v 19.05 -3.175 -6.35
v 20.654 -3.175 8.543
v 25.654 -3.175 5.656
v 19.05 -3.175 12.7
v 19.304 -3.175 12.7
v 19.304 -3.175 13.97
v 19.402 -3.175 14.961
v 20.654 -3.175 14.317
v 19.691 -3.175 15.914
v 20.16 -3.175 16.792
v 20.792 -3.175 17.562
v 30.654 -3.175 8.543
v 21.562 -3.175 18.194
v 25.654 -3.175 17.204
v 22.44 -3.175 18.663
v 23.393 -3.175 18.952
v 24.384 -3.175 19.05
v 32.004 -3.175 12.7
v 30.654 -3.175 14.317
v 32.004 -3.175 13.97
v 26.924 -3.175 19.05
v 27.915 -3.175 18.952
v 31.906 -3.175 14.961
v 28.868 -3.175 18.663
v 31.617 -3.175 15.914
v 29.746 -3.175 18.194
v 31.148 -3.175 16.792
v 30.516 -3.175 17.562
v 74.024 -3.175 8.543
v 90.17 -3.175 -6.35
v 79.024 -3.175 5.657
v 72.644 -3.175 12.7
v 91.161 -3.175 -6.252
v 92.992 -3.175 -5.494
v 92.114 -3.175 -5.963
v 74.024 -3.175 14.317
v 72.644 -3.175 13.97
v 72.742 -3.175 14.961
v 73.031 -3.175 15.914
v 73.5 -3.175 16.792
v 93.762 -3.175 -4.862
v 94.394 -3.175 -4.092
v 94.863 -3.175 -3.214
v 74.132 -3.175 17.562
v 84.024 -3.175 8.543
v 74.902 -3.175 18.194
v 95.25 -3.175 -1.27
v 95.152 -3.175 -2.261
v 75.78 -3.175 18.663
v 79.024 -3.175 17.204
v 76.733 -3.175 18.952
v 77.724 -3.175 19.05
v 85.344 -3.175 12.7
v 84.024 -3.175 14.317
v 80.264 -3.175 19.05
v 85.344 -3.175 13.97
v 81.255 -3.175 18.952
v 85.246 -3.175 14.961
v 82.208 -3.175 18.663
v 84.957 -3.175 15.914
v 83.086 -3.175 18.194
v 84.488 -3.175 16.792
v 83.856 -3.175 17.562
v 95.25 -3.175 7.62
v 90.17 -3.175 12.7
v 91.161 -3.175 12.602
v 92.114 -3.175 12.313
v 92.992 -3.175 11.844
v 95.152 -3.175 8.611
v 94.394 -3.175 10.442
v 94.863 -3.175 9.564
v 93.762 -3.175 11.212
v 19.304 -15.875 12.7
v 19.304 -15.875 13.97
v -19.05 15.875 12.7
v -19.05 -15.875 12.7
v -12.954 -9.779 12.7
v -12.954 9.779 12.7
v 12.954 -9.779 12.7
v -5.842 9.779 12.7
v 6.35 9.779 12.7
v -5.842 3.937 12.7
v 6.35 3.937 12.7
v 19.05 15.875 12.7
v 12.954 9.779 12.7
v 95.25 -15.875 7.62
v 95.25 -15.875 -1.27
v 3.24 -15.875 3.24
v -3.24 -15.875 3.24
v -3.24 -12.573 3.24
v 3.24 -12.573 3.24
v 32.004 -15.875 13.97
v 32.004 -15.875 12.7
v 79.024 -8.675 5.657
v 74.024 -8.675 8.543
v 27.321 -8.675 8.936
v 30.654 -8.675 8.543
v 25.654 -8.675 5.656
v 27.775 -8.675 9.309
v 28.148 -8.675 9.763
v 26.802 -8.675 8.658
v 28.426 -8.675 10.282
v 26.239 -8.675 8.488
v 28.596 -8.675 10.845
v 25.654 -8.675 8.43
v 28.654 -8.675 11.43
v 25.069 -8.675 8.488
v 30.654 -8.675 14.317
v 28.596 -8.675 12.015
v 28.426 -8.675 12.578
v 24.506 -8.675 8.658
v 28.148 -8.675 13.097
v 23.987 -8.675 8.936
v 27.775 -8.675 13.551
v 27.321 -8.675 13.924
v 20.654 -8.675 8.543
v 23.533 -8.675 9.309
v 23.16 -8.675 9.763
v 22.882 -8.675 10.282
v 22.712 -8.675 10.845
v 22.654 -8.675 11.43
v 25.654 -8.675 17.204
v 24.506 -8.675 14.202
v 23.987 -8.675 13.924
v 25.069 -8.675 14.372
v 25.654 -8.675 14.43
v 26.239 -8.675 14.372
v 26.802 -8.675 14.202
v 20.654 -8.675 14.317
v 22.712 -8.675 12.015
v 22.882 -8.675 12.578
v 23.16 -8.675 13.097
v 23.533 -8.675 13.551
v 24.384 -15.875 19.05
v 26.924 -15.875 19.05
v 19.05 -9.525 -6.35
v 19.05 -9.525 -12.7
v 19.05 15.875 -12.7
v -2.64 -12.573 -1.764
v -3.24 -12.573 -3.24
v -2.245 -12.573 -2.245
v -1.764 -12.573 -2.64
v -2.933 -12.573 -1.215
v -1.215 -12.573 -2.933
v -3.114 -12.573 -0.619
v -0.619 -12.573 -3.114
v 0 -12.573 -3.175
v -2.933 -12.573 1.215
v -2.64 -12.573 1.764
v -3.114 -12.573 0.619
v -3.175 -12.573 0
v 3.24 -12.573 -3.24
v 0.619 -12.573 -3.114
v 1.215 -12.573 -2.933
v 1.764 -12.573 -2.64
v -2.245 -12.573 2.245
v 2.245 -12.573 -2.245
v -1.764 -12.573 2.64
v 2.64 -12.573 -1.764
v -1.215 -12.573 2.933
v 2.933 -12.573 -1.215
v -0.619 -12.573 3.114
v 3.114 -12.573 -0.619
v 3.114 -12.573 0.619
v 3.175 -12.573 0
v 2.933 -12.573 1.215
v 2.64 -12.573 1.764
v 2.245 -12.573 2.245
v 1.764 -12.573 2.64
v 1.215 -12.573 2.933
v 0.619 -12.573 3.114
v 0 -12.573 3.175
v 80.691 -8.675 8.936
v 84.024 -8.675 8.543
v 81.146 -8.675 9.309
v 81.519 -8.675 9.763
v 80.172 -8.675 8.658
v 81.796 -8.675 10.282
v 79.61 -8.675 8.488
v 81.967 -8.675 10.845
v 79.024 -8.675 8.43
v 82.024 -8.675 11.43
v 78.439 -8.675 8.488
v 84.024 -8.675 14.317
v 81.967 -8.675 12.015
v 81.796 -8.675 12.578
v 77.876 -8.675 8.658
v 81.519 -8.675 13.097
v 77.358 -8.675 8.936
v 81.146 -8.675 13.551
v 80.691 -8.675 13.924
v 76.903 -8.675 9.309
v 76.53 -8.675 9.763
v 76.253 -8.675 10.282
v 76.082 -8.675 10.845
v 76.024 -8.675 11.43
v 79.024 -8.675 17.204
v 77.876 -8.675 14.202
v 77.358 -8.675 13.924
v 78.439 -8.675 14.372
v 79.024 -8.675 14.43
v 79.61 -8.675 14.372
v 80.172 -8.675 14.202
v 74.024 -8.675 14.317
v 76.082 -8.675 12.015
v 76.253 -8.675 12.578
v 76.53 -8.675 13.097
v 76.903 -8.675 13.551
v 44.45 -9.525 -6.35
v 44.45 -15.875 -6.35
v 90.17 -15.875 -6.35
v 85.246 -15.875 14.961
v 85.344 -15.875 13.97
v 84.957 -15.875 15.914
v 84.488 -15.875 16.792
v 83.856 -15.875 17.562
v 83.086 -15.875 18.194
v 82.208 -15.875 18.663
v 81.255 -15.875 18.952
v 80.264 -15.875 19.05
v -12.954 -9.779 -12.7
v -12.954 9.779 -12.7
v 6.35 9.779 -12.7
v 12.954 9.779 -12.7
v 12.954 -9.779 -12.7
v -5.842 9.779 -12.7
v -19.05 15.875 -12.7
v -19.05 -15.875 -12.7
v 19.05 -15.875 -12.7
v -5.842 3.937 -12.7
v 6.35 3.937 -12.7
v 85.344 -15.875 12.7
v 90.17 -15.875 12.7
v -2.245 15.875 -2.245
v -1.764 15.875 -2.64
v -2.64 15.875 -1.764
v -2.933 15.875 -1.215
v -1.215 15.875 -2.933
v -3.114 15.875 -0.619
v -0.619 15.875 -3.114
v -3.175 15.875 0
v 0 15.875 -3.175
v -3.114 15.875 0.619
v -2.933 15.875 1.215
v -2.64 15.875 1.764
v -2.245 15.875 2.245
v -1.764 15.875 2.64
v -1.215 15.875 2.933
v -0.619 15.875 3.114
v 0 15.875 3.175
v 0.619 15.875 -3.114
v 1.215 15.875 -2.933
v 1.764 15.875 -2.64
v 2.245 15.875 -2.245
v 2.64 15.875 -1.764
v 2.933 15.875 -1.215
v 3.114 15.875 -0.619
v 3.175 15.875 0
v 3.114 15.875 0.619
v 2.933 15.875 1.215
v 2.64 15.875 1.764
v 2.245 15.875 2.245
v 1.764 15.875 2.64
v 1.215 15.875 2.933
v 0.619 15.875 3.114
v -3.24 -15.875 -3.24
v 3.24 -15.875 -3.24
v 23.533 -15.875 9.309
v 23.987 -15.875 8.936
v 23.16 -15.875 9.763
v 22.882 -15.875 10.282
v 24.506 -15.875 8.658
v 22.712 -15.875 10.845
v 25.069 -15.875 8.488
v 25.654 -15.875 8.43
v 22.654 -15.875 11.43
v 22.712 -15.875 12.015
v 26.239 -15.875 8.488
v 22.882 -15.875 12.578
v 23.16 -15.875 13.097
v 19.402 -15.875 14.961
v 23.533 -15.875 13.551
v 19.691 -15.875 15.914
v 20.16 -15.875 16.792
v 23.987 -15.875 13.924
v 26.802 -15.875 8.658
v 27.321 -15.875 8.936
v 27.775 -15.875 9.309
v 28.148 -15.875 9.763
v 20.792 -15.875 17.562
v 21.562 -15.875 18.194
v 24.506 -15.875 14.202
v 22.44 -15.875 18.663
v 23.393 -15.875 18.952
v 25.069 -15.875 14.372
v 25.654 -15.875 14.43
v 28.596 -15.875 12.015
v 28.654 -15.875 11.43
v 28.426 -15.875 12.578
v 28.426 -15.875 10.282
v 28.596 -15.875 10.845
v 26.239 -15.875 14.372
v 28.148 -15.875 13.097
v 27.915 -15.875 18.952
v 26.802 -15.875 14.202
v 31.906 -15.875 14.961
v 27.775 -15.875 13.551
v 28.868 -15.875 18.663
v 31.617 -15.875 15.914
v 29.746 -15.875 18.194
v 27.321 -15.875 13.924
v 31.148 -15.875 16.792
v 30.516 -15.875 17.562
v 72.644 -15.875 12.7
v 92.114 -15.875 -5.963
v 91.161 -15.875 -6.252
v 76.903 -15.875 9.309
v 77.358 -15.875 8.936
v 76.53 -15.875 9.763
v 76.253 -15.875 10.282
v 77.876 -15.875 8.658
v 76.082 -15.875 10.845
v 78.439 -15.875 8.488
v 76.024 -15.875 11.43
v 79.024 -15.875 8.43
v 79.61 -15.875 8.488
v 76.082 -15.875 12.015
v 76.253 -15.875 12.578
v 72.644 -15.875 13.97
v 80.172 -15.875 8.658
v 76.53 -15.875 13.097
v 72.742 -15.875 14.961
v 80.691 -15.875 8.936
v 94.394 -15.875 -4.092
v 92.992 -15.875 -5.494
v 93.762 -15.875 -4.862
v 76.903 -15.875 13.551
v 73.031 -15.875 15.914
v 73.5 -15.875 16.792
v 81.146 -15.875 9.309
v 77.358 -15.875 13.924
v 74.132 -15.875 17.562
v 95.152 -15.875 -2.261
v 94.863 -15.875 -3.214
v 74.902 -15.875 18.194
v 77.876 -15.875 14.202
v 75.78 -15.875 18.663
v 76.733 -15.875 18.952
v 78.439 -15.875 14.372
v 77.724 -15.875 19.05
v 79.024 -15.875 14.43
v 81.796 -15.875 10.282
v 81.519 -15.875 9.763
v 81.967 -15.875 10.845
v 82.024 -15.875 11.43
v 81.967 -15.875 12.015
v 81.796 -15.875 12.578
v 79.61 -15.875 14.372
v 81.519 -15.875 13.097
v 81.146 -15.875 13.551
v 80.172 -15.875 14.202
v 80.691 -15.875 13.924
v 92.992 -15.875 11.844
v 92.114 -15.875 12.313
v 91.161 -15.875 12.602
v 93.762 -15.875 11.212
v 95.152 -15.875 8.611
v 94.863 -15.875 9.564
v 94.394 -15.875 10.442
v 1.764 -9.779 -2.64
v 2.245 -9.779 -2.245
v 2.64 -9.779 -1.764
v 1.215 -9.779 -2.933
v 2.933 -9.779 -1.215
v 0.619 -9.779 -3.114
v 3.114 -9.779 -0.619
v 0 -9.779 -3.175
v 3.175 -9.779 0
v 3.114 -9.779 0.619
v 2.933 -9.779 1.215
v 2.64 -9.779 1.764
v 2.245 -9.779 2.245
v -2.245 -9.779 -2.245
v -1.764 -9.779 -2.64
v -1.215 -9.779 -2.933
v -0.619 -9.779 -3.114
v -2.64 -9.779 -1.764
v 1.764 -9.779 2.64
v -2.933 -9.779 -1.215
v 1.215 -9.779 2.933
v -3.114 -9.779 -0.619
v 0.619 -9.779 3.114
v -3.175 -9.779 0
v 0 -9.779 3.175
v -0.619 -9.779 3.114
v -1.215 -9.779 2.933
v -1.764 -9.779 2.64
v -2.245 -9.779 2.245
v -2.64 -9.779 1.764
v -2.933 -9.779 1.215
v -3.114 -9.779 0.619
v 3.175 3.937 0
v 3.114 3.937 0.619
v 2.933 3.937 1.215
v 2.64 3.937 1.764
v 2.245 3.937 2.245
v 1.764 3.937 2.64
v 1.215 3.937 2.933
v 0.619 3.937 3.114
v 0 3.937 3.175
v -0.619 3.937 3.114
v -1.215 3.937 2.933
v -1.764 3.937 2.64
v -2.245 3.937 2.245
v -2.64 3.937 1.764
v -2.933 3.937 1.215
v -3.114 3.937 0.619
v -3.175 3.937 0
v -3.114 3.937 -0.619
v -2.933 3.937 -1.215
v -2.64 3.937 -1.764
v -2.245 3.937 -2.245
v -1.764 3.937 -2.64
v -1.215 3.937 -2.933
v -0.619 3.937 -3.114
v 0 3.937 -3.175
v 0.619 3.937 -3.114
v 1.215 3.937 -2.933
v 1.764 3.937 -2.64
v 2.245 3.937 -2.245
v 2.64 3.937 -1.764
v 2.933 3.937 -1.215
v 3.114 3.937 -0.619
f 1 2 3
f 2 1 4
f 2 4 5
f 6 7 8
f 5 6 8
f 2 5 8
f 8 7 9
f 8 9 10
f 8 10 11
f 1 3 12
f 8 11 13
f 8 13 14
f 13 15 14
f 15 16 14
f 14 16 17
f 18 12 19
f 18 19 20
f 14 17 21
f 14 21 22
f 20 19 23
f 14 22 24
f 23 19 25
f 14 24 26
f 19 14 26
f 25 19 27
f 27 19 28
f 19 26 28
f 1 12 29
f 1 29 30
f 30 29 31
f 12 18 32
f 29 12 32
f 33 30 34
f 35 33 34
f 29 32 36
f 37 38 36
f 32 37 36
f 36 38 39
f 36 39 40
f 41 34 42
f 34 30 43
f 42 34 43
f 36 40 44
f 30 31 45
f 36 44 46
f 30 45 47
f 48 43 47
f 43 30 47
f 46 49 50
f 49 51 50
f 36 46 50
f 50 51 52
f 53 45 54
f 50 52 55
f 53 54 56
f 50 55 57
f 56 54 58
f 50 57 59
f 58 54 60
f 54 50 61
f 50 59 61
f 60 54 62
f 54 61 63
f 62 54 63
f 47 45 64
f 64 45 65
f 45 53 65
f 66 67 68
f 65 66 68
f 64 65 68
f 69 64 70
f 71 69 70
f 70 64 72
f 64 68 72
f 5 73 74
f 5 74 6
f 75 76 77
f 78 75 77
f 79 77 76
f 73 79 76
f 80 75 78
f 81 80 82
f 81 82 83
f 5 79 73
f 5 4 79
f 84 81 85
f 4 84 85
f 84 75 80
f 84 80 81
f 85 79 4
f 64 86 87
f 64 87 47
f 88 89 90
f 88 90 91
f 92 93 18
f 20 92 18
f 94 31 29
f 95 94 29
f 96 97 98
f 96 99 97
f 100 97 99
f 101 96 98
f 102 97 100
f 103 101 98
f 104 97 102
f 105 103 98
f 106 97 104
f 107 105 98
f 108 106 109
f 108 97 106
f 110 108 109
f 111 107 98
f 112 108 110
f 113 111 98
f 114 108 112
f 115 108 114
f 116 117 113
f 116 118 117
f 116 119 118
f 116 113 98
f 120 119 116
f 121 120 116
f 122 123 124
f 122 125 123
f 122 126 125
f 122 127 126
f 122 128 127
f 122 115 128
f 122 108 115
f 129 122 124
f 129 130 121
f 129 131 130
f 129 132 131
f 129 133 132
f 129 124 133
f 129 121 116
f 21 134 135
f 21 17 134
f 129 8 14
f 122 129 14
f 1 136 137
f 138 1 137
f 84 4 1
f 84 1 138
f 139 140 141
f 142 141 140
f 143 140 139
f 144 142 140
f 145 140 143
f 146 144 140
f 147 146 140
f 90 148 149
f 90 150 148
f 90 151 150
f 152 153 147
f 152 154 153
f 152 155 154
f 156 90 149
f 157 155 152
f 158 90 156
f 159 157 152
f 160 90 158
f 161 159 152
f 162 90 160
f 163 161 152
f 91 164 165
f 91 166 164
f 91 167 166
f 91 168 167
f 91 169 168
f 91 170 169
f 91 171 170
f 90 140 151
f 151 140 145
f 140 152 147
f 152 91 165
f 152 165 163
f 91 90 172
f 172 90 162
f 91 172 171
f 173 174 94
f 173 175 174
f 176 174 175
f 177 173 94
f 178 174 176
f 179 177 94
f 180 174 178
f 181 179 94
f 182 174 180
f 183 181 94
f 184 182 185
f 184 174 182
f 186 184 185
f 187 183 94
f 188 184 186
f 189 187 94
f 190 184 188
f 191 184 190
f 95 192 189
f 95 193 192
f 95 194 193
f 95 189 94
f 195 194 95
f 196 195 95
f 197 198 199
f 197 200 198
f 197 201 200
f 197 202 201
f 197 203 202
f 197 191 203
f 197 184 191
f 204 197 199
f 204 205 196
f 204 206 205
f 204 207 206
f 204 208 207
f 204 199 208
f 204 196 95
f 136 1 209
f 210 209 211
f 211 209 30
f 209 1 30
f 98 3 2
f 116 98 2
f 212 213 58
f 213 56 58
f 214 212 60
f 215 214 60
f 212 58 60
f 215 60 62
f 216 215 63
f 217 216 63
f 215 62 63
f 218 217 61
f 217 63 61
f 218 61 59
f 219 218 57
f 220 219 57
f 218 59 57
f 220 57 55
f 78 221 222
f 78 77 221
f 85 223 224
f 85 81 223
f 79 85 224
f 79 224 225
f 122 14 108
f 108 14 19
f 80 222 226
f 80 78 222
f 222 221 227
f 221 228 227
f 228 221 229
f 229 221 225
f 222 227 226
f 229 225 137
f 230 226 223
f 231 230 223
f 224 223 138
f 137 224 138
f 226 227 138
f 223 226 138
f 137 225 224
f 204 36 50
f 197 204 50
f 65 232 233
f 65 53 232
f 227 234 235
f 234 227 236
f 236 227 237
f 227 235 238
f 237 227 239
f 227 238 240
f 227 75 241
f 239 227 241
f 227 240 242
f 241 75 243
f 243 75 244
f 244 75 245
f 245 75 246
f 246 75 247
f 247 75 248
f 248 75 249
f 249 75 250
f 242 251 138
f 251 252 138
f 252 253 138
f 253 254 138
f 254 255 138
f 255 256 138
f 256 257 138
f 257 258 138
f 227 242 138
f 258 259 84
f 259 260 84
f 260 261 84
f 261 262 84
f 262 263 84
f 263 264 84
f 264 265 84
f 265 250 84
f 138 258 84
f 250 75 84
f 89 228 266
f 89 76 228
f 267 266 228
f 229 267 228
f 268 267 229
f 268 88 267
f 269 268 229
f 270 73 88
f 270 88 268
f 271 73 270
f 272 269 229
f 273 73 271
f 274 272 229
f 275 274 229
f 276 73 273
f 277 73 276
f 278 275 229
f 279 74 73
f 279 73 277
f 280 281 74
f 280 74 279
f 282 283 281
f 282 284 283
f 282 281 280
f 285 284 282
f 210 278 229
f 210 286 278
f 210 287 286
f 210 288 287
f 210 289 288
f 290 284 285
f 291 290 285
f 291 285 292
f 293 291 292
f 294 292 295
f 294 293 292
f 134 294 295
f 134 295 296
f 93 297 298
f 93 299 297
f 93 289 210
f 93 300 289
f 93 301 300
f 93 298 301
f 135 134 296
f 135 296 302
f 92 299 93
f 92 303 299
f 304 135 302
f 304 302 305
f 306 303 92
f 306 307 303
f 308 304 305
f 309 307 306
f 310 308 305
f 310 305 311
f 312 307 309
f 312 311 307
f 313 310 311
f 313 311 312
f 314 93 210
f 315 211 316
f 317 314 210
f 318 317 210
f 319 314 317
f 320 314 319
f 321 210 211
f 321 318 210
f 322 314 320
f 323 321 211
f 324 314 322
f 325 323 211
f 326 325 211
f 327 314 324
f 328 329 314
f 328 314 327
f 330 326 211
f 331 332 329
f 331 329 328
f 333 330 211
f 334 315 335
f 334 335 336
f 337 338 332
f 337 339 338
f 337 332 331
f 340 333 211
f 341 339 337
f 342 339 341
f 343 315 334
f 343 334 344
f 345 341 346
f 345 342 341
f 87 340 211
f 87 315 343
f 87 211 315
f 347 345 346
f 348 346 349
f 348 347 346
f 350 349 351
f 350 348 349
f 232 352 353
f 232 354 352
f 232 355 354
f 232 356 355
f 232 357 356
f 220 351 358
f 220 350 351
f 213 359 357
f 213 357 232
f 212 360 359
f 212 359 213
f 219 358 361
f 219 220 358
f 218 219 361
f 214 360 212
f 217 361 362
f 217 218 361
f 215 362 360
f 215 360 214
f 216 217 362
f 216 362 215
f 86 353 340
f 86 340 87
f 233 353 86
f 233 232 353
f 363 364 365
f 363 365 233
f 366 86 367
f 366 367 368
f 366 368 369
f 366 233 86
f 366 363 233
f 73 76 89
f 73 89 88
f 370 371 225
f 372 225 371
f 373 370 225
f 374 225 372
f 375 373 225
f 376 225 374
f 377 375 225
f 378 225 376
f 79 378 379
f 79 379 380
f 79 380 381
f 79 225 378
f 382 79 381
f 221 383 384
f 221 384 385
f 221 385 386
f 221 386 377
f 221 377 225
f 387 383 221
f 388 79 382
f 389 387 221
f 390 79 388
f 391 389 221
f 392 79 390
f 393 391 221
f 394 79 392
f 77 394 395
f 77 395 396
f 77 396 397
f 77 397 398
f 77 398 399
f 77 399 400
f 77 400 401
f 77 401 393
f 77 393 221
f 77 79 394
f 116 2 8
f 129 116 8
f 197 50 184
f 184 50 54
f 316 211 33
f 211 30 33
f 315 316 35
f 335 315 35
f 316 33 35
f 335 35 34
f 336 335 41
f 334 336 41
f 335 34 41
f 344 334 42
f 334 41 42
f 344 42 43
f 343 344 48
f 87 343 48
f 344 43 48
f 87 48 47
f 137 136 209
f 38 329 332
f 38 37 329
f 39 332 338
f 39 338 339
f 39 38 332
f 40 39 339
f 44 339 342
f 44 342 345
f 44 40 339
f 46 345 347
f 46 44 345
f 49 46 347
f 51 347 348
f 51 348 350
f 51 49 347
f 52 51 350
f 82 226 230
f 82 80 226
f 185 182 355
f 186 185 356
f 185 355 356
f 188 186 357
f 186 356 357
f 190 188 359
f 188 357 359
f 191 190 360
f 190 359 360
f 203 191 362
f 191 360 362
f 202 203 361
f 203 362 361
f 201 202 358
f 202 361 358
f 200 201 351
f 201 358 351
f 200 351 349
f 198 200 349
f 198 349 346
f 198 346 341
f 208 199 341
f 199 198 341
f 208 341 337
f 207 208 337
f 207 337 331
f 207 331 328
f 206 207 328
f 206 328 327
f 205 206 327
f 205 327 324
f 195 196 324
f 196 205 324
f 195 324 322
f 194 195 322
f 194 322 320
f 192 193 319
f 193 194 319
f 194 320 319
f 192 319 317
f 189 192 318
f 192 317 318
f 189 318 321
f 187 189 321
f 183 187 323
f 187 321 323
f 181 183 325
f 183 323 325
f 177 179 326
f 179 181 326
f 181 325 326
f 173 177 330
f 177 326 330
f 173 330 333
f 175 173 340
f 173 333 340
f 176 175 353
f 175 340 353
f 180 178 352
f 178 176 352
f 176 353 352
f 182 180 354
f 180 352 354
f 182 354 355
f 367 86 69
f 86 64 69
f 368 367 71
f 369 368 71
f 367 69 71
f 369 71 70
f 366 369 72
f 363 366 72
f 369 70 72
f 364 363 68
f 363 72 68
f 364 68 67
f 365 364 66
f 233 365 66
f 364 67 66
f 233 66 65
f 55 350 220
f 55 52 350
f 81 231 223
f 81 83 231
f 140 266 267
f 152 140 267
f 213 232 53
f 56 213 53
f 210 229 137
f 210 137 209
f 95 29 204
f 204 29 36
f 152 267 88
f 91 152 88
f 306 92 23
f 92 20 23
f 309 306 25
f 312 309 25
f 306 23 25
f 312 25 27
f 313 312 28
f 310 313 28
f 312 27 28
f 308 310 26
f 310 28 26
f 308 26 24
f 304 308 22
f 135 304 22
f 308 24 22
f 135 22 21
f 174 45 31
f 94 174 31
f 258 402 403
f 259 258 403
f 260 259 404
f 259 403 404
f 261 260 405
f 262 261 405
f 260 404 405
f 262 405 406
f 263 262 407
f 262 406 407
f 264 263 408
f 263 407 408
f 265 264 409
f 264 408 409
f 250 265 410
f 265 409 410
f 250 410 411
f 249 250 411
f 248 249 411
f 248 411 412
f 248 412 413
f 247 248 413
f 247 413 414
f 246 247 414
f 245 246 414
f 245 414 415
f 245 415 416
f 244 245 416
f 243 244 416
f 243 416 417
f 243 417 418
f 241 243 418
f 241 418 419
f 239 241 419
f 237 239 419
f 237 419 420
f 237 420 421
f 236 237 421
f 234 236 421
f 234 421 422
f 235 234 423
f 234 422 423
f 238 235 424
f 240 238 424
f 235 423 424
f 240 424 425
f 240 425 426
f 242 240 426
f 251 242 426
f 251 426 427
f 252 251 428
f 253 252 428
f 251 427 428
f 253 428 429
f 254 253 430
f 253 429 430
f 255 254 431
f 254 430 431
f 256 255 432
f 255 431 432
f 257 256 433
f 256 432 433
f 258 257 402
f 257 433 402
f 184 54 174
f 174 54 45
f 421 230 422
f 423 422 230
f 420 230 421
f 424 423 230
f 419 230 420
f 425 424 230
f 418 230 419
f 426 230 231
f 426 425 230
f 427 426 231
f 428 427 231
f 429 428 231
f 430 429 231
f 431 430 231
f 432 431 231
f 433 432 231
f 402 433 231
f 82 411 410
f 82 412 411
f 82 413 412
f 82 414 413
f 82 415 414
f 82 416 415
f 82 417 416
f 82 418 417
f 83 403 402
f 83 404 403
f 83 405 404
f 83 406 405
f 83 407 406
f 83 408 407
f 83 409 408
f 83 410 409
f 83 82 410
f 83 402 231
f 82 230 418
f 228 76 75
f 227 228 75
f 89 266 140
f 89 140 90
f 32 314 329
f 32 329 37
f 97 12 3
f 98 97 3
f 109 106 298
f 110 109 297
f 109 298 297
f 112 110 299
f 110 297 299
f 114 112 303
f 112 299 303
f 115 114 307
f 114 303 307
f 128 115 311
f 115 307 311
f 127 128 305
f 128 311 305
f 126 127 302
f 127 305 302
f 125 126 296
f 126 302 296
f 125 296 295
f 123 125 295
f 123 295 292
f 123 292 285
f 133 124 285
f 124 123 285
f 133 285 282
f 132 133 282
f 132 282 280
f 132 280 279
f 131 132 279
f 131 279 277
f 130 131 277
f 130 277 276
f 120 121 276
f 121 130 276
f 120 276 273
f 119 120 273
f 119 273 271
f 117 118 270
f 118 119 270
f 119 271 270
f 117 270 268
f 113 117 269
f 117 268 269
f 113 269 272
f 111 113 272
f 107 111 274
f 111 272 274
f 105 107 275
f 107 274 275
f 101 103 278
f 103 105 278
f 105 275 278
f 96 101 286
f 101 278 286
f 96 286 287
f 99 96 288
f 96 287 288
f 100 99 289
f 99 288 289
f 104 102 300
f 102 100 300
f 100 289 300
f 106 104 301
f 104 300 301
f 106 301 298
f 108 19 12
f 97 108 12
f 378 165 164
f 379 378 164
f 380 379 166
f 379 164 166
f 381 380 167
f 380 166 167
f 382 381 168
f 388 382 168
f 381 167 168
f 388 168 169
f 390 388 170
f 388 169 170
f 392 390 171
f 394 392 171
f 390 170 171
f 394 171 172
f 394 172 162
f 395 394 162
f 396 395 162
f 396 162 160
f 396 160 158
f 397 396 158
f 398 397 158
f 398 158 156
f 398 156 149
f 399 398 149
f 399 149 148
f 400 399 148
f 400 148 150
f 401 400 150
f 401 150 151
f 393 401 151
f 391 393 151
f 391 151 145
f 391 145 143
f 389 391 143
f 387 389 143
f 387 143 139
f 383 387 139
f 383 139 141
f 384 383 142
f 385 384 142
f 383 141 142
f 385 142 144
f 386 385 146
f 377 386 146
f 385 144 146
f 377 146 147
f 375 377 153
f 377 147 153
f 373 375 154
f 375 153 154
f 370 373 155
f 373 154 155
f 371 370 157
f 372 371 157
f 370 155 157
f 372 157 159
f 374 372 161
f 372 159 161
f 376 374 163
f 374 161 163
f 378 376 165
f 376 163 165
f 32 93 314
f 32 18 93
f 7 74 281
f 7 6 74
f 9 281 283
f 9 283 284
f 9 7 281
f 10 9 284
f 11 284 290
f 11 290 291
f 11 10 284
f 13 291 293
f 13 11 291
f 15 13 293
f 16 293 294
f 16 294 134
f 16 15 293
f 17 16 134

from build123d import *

# Parameters (mm, degrees)
F0_W      = 38.1
F0_H      = 31.75
F1_DEPTH  = 12.7
F2_R      = 3.175
F3_DEPTH  = 31.751
F4_W      = 6.48
F4_H      = 6.48
F5_DEPTH  = 3.302
F6_W      = 76.2
F6_H      = 12.7
F7_DEPTH  = 19.05
F9_DEPTH  = 6.35
F10_W     = 12.7
F10_H     = 12.7
F11_DEPTH = 6.35
F12_R     = 5.08
F13_R     = 3
F14_DEPTH = 31.751
F15_R     = 3
F16_DEPTH = 5.5
F17_R     = 5.08


with BuildPart() as f1:
    # F0 (on Top) → F1 (new body, symmetric)
    with BuildSketch(Plane.XY):
        Rectangle(F0_W, F0_H)
        Polygon((12.954, 9.779), (12.954, -9.779), (-12.954, -9.779), (-12.954, 9.779), (-5.842, 9.779), (-5.842, 3.937), (6.35, 3.937), (6.35, 9.779), align=None, mode=Mode.SUBTRACT)
    extrude(amount=F1_DEPTH, both=True)

    # F2 (on face) → F3 (cut, through all)
    with BuildSketch(Plane.XZ.offset(15.875)):
        Circle(F2_R)
    extrude(amount=-F3_DEPTH, mode=Mode.SUBTRACT)

    # F4 (on face) → F5 (cut)
    with BuildSketch(Plane.XZ.offset(15.875)):
        Rectangle(F4_W, F4_H)
    extrude(amount=-F5_DEPTH, mode=Mode.SUBTRACT)

    # F6 (on face) → F7 (join)
    with BuildSketch(Plane.XY.offset(12.7)):
        with Locations((57.15, -9.525)):
            Rectangle(F6_W, F6_H)
    extrude(amount=-F7_DEPTH)

    # F8 (on face) → F9 (join)
    with BuildSketch(Plane.XZ.offset(15.875)):
        Polygon((19.05, -6.35), (19.05, -12.7), (44.45, -6.35), align=None)
    extrude(amount=-F9_DEPTH)

    # F10 (on face) → F11 (join)
    with BuildSketch(Plane.XY.offset(12.7)):
        with Locations((25.654, -9.525)):
            Rectangle(F10_W, F10_H)
        with Locations((78.994, -9.525)):
            Rectangle(F10_W, F10_H)
    extrude(amount=F11_DEPTH)

    # F12
    f12_edges = [f1.edges().sort_by_distance(p)[0] for p in [
        (19.304, -9.525, 19.05),
        (32.004, -9.525, 19.05),
        (72.644, -9.525, 19.05),
        (85.344, -9.525, 19.05),
    ]]
    fillet(f12_edges, radius=F12_R)

    # F13 (on face) → F14 (cut, through all)
    with BuildSketch(Plane.XZ.offset(15.875)):
        with Locations((25.653916178, 11.4300000005)):
            Circle(F13_R)
        with Locations((79.0242652024, 11.4300601041)):
            Circle(F13_R)
    extrude(amount=-F14_DEPTH, mode=Mode.SUBTRACT)

    # F15 (on face) → F16 (cut)
    with BuildSketch(Plane(origin=(0, -3.175, 0), x_dir=(-1, 0, 0), z_dir=(0, 1, 0))):
        Polygon((-84.0242652024, 8.5433087581), (-79.0242652024, 5.6565574122), (-74.0242652024, 8.5433087581), (-74.0242652024, 14.31681145), (-79.0242652024, 17.203562796), (-84.0242652024, 14.31681145), align=None)
        with Locations((-79.0242652024, 11.4300601041)):
            Circle(F15_R, mode=Mode.SUBTRACT)
        Polygon((-30.653916178, 8.5432486545), (-25.653916178, 5.6564973086), (-20.653916178, 8.5432486545), (-20.653916178, 14.3167513464), (-25.653916178, 17.2035026924), (-30.653916178, 14.3167513464), align=None)
        with Locations((-25.653916178, 11.4300000005)):
            Circle(F15_R, mode=Mode.SUBTRACT)
    extrude(amount=-F16_DEPTH, mode=Mode.SUBTRACT)

    # F17
    f17_edges = [f1.edges().sort_by_distance(p)[0] for p in [
        (95.25, -9.525, 12.7),
        (95.25, -9.525, -6.35),
    ]]
    fillet(f17_edges, radius=F17_R)


solid = f1.part
